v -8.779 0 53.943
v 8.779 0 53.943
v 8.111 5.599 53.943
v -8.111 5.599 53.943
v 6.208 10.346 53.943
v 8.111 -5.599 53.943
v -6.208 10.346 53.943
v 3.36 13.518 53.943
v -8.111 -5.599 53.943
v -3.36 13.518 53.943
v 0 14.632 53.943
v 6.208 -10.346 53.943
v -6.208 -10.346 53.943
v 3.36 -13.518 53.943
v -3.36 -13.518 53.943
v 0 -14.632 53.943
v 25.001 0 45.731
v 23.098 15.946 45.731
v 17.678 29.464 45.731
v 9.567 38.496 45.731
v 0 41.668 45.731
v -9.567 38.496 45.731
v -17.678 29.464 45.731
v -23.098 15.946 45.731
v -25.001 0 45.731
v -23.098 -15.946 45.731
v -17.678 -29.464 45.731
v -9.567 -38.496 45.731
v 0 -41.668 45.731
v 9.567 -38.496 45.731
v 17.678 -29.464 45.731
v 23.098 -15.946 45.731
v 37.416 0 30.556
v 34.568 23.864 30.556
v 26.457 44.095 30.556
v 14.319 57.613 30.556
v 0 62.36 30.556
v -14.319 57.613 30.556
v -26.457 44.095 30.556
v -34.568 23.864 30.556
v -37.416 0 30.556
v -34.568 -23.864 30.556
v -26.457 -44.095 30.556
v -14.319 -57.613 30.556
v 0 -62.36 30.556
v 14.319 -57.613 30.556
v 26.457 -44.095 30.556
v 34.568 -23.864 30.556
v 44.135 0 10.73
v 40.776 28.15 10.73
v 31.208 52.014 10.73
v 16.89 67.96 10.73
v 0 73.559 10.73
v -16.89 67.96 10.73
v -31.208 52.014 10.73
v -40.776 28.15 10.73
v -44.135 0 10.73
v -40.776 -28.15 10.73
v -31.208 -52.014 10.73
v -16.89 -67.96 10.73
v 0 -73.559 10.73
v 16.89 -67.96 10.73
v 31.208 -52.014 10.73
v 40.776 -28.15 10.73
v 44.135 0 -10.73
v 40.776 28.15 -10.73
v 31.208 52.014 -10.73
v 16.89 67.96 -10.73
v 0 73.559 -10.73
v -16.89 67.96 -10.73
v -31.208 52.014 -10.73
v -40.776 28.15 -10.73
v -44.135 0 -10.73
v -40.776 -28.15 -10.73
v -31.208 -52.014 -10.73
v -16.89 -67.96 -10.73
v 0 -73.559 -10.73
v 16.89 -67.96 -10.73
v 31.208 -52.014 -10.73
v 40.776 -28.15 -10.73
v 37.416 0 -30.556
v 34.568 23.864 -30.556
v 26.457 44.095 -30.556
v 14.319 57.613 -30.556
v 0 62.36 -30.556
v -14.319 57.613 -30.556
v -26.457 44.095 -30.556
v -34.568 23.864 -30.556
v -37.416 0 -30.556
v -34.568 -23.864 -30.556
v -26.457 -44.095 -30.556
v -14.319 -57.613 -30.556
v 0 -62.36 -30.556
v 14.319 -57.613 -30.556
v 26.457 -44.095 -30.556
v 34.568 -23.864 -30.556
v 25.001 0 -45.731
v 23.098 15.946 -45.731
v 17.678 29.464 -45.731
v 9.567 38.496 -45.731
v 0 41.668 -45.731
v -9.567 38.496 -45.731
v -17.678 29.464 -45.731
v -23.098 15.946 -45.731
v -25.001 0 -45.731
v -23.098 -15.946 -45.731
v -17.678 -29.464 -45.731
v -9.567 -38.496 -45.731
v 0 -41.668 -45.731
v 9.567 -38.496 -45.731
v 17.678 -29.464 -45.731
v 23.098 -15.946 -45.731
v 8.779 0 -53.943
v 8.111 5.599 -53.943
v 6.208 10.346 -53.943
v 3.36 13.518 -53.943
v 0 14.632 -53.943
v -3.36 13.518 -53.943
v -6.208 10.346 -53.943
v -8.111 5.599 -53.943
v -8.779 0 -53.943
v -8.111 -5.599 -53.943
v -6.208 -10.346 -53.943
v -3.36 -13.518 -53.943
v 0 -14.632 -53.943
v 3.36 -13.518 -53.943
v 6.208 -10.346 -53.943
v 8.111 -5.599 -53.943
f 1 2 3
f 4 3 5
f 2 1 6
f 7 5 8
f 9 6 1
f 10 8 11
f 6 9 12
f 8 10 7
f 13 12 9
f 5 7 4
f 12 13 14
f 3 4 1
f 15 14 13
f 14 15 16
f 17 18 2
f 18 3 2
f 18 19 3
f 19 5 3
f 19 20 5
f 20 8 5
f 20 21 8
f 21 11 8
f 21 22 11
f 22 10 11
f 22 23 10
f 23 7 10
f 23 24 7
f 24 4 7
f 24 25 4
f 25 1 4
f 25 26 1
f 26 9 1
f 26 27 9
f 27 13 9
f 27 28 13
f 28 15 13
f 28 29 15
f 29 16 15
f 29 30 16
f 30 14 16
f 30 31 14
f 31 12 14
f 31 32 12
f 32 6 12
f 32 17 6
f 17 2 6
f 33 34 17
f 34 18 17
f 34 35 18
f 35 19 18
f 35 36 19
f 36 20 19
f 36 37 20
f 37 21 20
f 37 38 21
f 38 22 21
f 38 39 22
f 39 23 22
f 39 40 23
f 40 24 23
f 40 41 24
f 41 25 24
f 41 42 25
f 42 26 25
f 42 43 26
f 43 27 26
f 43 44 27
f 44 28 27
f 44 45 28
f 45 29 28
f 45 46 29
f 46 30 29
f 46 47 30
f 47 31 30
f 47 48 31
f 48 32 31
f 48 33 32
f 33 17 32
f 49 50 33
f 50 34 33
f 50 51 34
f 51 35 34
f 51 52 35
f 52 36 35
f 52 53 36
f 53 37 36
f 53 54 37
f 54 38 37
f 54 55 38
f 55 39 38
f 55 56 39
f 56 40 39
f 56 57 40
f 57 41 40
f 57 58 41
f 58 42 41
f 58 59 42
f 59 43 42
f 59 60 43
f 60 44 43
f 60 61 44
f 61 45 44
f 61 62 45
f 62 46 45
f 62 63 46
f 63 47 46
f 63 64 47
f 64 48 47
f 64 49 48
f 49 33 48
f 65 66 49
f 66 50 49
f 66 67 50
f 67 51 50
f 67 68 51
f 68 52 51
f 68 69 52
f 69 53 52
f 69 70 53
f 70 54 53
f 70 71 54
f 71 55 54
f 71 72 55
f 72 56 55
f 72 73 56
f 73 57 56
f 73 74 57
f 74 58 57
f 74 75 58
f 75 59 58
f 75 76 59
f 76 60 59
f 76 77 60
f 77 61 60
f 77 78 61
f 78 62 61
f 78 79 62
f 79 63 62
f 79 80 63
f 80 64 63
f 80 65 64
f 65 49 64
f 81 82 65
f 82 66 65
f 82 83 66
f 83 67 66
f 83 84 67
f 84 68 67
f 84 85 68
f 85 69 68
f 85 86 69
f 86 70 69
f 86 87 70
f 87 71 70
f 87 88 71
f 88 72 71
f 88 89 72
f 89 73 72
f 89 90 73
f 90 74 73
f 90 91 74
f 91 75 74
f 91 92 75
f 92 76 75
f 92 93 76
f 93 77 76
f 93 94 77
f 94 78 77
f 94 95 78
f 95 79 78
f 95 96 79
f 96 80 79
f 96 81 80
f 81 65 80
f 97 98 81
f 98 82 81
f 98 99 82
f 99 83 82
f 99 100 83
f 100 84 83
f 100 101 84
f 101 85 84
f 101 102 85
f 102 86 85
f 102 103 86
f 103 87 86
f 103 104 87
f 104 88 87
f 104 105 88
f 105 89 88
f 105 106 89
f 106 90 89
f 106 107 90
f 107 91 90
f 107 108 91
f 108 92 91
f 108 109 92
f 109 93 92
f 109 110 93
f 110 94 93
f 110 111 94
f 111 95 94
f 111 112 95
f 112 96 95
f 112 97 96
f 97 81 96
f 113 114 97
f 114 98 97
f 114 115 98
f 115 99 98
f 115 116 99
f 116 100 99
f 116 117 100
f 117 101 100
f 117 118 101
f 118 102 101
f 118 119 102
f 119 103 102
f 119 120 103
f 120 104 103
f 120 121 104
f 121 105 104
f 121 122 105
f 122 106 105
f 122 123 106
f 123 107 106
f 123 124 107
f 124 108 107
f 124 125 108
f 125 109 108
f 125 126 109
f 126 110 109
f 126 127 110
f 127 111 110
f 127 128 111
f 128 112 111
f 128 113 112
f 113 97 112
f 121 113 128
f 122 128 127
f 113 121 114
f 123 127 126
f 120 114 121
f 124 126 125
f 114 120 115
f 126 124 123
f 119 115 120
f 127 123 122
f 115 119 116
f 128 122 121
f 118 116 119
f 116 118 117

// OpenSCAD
// Generated by SolidPython 1.0.1 on 2020-07-29 00:46:49


scale(v = [9, 15, 11]) {
	sphere(r = 5);
}
/***********************************************
*********      SolidPython code:      **********
************************************************
 
# import packages: SolidPython
from solid import *
from solid.utils import *
from itertools import chain, combinations, permutations


class Resize:

    def __init__(self, scad_file):
        self.scad_file = scad_file
        #self.scad_file = import_scad(scad_file)
        # cone/cylinder param:
        self.r1 = 0
        self.r2 = 0
        self.h = 0
        # rectangular prism param:
        self.w = 0
        self.l = 0
        # ellipse param:
        self.r = 0

    # import OpenScad code (file name corresponds to shape)


    # classify shape + parameters
    def assign(self, param1, param2, param3):
        if self.scad_file == 'cone.scad':
            self.r1 = param1
            self.r2 = param2
            self.h = param3
        elif self.scad_file == 'cylinder.scad':
            self.r1 = param1
            self.r2 = param2
            self.h = param3
        elif self.scad_file == 'rectangularPrism.scad':
            self.h = param1
            self.l = param2
            self.w = param3
        else:
            self.r = param1
            self.h = param2

    # resize parameters
    def iterate(self):
        x = range(3, 20, 2)
        i = 1
        if self.scad_file == 'cone.scad':
            tempList = list(permutations(x, 2))
            for temp in tempList:
                param1 = temp[0]
                param2 = temp[1]
                filepath = 'produced_scad_files/' + 'cone' + str(param1) + '_' + str(param2) + '_' + '.scad'
                scad_render_to_file(cylinder(h=param1, r1=param2, r2=0), filepath)

        elif self.scad_file == 'cylinder.scad':
            tempList = list(permutations(x, 3))
            for temp in tempList:
                param1 = temp[0]
                param2 = temp[1]
                filepath = 'produced_scad_files/' + 'cylinder' + str(param1) + '_' + str(param2) + '_' + '.scad'
                scad_render_to_file(cylinder(h=param1, r1=param2, r2=param2), filepath)

        elif self.scad_file == 'rectangularPrism.scad':
            tempList = list(permutations(x, 3))
            for temp in tempList:
                param1 = temp[0]
                param2 = temp[1]
                param3 = temp[2]
                filepath = 'produced_scad_files/' + 'rectangularPrism' + str(param1) + '_' + str(param2) + '_' + str(
                    param3) + '.scad'
                scad_render_to_file(cube(size=(param1, param2, param3)), filepath)

        elif self.scad_file == 'ellipse.scad':
            tempList = list(permutations(x, 4))
            for temp in tempList:
                param1 = temp[0]
                param2 = temp[1]
                param3 = temp[2]
                param4 = temp[3]
                filepath = 'produced_scad_files/' + 'ellipse' + str(param1) + '_' + str(param2) + '_' + str(param3) + '_' + str(param4) + '.scad'
                scad_render_to_file(scale([param1, param2, param3])(sphere(r=param4)), filepath)

    def render_to_scadfile(self):
        scad_render_to_file(scad, 'example.scad') 
 
************************************************/
